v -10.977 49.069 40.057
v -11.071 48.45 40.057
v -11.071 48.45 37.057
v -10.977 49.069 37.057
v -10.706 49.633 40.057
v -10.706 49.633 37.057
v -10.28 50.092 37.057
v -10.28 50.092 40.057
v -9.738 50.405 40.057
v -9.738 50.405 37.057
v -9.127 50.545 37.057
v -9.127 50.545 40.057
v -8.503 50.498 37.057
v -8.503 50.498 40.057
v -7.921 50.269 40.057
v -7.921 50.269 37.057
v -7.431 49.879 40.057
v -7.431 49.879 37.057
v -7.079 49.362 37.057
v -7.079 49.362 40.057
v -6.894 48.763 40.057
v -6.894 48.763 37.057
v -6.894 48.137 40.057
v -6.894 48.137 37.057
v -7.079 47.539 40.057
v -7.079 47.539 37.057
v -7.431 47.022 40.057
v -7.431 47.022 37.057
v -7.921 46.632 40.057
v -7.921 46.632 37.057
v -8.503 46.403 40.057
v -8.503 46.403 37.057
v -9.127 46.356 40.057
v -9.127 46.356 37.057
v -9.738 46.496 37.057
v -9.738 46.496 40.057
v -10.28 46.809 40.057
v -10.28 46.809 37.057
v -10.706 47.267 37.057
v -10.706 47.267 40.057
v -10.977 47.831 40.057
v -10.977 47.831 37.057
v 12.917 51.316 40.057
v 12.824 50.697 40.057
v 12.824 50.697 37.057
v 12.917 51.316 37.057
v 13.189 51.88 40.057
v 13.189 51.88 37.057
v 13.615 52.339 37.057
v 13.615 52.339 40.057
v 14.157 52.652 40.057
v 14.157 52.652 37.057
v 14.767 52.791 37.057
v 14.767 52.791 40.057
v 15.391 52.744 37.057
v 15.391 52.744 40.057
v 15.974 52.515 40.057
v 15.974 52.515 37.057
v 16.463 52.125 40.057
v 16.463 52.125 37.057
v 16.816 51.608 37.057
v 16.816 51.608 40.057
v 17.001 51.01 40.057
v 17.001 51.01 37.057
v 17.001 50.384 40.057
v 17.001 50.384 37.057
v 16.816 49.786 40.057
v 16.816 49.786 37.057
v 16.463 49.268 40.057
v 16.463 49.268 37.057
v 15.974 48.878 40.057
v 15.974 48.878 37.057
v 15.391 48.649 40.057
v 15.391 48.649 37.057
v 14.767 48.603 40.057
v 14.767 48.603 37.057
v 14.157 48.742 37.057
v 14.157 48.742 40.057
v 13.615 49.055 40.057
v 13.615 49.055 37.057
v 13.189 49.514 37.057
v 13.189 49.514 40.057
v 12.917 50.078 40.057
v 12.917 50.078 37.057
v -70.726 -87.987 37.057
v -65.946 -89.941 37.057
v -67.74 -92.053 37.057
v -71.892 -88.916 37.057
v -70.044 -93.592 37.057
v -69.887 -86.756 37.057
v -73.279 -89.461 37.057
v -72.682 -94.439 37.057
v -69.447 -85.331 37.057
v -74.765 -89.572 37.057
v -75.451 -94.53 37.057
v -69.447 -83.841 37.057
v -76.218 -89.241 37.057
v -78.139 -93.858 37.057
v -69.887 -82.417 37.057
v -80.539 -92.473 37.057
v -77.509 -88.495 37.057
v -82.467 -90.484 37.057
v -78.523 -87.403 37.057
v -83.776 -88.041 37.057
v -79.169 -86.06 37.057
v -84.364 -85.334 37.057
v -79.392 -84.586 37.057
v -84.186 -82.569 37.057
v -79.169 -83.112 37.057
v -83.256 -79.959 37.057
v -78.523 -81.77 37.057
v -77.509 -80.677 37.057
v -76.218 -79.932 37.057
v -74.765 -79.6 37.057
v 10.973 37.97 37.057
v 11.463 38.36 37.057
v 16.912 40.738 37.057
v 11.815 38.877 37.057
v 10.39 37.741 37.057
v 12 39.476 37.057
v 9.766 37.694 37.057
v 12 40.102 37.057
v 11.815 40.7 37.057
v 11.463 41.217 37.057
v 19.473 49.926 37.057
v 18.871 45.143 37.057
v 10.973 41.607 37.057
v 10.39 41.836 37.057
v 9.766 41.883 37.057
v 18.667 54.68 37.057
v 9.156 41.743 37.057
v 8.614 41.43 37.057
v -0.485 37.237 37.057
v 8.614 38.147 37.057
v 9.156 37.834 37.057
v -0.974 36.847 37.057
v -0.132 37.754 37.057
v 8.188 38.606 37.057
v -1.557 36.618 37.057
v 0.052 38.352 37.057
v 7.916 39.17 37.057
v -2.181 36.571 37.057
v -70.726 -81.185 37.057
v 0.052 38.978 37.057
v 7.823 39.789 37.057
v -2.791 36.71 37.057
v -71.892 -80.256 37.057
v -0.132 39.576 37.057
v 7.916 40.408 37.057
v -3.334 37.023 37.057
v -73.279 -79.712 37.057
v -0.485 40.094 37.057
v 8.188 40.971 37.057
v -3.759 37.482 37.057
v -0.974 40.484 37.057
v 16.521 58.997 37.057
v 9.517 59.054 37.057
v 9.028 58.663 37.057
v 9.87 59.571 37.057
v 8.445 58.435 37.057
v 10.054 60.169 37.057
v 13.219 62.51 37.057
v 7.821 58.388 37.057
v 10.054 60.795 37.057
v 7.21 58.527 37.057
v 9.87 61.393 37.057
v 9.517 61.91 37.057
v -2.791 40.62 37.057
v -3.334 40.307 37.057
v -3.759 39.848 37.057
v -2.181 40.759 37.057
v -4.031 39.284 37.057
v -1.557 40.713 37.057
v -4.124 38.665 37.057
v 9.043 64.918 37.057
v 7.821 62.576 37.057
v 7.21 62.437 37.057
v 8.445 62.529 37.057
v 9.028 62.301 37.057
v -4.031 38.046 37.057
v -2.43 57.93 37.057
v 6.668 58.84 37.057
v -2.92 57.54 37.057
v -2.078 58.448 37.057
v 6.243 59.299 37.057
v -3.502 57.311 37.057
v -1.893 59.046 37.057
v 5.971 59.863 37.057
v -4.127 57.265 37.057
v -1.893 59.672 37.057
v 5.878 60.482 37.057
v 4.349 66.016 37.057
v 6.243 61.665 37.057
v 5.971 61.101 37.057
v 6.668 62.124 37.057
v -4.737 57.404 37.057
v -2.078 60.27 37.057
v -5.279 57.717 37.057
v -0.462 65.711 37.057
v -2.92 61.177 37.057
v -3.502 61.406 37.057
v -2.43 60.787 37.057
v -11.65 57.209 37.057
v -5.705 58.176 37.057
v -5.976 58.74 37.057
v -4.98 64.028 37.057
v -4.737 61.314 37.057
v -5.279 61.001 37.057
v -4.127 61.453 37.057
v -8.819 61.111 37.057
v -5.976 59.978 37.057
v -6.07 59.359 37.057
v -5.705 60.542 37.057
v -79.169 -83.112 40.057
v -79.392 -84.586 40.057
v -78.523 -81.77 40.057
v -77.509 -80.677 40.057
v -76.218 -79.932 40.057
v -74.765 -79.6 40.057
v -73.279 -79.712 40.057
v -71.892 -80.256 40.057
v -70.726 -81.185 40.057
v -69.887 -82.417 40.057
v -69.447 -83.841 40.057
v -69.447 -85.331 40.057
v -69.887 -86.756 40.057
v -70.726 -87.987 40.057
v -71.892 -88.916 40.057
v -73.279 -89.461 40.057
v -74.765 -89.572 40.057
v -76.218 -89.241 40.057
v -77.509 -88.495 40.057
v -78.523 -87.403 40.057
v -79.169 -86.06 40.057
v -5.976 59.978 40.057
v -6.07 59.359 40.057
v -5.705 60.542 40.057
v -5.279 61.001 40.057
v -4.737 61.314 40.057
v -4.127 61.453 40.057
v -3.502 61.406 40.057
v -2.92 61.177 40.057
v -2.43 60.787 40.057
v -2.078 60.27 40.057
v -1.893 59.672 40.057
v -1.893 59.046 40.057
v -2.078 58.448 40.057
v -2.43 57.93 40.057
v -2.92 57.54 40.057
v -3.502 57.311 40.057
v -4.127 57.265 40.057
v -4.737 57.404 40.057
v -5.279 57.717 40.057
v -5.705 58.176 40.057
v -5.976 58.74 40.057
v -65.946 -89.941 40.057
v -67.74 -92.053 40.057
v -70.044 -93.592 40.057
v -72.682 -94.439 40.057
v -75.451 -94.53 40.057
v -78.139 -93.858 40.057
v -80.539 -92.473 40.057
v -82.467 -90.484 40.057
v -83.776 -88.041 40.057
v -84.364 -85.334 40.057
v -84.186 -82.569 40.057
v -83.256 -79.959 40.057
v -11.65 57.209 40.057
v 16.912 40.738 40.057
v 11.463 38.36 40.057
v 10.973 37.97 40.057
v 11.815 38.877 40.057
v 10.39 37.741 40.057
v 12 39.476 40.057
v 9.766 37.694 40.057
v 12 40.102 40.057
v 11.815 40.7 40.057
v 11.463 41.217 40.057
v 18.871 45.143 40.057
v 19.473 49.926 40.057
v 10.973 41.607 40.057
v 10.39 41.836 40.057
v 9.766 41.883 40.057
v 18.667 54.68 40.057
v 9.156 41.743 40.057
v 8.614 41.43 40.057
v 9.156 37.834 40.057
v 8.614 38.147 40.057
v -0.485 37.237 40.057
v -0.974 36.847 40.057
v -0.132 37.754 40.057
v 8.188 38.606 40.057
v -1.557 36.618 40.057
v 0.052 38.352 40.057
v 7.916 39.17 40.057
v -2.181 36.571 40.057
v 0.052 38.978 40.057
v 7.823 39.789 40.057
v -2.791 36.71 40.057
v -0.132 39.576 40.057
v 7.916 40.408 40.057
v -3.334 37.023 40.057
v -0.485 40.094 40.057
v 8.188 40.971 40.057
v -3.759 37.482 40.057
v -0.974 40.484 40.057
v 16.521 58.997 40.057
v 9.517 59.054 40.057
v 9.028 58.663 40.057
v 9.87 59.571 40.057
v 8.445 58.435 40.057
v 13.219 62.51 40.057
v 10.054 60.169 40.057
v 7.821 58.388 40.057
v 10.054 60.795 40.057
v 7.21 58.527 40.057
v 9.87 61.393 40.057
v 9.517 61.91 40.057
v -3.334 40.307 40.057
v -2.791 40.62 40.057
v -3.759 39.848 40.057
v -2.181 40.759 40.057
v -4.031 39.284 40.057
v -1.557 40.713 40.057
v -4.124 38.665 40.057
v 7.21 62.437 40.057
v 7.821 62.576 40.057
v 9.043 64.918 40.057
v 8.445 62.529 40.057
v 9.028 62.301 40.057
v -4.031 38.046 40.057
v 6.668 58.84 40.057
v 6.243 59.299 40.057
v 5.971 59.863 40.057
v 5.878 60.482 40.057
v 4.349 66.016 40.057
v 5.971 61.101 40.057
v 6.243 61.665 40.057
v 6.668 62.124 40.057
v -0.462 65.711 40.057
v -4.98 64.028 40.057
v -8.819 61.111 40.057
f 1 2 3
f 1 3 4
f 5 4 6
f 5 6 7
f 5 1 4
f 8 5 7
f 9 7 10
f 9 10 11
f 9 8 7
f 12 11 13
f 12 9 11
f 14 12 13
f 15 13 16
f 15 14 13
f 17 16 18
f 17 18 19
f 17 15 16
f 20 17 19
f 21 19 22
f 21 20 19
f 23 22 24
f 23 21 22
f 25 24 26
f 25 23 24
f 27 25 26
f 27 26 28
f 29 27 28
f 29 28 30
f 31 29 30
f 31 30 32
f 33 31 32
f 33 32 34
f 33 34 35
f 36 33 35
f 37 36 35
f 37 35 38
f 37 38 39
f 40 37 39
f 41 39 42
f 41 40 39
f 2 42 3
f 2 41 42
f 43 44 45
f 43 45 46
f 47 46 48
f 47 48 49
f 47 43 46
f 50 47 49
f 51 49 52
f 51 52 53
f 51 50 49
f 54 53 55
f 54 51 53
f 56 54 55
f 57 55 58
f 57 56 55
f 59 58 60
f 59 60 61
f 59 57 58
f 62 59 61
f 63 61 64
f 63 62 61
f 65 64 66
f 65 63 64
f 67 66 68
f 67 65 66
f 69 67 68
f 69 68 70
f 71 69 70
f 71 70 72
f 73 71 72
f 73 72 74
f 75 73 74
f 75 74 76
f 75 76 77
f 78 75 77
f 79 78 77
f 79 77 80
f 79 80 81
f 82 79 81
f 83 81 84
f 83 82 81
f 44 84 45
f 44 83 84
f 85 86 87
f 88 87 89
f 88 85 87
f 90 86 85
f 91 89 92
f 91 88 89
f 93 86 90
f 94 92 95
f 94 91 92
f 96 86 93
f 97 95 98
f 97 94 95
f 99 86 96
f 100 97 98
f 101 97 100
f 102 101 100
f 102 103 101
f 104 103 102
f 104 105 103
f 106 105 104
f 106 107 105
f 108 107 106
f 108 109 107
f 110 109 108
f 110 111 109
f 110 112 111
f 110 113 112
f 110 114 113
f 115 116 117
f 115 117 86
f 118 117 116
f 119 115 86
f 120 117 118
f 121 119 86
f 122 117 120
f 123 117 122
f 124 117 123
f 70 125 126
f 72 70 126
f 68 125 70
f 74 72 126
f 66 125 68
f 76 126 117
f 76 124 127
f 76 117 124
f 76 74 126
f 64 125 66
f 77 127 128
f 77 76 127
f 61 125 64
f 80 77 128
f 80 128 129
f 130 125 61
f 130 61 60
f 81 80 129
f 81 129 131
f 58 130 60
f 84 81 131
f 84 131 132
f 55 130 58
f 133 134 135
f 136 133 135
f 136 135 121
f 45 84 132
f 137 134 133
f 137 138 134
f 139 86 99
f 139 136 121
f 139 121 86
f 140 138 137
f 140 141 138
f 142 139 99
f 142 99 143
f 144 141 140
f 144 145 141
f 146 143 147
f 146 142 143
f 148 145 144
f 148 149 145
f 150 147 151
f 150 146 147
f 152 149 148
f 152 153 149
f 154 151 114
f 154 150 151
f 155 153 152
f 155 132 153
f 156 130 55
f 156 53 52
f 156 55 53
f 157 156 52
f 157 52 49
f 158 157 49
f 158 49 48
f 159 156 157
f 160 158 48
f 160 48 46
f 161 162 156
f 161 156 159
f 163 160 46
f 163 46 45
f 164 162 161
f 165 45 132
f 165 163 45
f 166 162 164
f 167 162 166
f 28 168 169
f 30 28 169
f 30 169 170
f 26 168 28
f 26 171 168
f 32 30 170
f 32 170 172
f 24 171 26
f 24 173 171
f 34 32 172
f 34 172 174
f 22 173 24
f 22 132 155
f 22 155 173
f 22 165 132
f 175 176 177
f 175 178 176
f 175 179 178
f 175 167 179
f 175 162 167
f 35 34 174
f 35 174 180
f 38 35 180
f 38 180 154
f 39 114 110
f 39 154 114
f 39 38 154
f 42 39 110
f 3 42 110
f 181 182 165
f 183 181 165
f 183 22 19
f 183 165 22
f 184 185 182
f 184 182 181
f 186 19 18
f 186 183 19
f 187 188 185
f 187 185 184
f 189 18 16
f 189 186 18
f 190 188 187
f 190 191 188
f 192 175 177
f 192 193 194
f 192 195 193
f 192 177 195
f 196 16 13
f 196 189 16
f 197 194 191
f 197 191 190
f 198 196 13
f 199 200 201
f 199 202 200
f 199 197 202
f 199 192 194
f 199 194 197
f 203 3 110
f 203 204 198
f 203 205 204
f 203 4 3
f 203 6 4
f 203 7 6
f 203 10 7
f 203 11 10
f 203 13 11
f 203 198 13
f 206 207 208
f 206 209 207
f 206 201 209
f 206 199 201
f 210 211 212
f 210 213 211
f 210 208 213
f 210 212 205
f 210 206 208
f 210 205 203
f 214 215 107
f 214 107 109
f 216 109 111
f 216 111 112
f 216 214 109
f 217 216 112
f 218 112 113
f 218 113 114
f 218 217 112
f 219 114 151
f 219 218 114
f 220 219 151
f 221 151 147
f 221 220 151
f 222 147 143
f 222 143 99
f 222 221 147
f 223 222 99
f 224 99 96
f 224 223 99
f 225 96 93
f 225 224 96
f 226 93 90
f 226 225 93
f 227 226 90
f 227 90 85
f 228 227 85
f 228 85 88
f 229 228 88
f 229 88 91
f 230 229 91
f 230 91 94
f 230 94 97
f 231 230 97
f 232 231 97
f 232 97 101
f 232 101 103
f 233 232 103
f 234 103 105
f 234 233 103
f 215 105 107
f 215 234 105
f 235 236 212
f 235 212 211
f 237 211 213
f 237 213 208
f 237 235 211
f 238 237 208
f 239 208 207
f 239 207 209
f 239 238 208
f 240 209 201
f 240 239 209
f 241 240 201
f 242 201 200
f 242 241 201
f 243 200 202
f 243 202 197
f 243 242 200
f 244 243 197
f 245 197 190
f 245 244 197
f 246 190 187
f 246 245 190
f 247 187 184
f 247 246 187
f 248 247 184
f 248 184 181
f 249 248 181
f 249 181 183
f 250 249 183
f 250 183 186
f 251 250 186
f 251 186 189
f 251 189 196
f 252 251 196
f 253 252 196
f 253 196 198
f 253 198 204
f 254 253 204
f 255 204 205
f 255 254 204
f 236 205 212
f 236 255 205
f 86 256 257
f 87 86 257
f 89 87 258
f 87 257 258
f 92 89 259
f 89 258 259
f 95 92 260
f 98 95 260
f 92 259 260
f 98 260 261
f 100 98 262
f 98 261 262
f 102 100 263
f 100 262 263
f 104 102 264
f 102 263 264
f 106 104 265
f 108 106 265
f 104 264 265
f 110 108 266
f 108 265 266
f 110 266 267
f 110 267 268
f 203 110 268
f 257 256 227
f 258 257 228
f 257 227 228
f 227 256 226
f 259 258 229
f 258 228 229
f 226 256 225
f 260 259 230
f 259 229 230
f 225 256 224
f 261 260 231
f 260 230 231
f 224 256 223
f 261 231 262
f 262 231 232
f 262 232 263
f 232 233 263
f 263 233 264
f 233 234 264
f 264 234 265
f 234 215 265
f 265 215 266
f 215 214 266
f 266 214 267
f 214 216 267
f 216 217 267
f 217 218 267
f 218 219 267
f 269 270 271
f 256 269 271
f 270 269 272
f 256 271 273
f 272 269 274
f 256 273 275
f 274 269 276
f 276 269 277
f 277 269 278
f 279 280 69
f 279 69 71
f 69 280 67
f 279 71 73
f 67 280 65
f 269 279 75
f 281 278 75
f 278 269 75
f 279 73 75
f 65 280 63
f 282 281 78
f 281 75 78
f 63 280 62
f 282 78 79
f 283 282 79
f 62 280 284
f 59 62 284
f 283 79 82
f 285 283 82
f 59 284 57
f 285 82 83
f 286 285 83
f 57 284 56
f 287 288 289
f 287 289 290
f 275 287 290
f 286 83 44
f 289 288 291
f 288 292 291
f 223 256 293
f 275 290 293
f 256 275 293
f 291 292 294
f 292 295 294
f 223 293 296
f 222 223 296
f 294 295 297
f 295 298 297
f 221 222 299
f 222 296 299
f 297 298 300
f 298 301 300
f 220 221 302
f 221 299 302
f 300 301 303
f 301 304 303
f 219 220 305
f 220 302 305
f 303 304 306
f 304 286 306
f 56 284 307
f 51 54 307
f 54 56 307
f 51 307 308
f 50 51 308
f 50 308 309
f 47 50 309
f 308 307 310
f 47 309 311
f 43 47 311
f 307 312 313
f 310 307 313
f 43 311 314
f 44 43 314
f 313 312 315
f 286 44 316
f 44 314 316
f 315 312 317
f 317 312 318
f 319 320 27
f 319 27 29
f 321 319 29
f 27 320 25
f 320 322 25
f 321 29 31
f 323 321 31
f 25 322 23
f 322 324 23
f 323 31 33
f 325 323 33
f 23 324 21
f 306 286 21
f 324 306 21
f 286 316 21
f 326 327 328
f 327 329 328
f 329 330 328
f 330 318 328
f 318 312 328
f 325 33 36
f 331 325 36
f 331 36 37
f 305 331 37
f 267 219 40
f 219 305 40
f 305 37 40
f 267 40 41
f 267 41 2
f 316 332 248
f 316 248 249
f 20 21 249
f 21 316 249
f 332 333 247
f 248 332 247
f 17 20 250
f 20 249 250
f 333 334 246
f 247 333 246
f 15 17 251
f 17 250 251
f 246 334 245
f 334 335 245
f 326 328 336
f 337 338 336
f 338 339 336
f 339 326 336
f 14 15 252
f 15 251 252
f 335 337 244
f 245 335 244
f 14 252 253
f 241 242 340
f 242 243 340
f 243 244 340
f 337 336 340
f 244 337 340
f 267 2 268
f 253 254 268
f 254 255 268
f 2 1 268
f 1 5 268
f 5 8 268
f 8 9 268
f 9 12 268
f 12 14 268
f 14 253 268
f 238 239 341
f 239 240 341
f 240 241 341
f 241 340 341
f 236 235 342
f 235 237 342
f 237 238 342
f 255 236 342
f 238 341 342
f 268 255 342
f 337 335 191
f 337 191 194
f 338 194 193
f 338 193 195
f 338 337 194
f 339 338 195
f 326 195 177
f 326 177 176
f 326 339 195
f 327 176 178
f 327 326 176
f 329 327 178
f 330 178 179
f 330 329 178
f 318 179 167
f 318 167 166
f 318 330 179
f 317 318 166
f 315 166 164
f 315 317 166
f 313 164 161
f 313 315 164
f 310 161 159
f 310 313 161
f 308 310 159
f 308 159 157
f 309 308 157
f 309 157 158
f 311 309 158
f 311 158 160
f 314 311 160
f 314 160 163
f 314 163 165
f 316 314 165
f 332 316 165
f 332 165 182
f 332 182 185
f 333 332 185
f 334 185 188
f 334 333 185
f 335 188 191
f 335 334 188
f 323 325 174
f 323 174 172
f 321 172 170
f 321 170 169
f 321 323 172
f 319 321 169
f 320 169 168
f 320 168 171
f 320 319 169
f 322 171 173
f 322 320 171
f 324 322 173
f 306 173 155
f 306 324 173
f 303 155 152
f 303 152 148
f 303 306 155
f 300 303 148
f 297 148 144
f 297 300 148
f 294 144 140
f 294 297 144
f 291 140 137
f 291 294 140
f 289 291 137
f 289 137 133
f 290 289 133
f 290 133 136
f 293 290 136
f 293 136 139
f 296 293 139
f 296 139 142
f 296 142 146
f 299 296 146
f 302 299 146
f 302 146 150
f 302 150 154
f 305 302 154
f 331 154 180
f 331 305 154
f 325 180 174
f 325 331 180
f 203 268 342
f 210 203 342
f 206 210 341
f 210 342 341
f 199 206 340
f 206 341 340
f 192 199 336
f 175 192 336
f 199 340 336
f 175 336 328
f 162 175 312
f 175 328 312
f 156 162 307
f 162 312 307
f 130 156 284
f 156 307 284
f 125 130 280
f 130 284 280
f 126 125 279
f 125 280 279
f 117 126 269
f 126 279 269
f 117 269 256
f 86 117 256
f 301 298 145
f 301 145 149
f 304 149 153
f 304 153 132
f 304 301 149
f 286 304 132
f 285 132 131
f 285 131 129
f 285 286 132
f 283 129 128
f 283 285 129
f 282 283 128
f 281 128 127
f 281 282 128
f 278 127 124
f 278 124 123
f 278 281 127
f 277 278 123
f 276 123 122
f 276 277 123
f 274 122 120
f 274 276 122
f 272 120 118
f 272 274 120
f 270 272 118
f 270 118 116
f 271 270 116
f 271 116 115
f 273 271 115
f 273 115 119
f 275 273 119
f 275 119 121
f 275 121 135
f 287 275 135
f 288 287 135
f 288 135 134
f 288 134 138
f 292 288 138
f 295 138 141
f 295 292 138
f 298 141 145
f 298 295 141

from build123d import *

# Parameters (mm, degrees)
SKETCH_1_R      = 5
SKETCH_1_R_2    = 2.1
EXTRUDE_1_DEPTH = 3


with BuildPart() as part:
    # 草图1 → 凸台-拉伸1 (new body)
    with BuildSketch(Plane(origin=(0, 0, 40.05672841), x_dir=(-1, 0, 0), z_dir=(0, 0, -1))):
        with BuildLine():
            Line((83.25633153, -79.958506894), (11.650116444, 57.209335041))
            ThreePointArc((11.650116444, 57.209335041), (-11.219662978, 63.867129513), (-16.911730575, 40.738069772))
            Line((-16.911730575, 40.738069772), (65.946121215, -89.941091905))
            ThreePointArc((65.946121215, -89.941091905), (79.387248151, -93.248956728), (83.25633153, -79.958506894))
        make_face()
        with Locations((74.391553652, -84.586218334)):
            Circle(SKETCH_1_R, mode=Mode.SUBTRACT)
        with Locations((-14.924086576, 50.696801373)):
            Circle(SKETCH_1_R_2, mode=Mode.SUBTRACT)
        with Locations((-7.977715561, 60.481888482)):
            Circle(SKETCH_1_R_2, mode=Mode.SUBTRACT)
        with Locations((3.969603961, 59.358698272)):
            Circle(SKETCH_1_R_2, mode=Mode.SUBTRACT)
        with Locations((8.970552467, 48.450420955)):
            Circle(SKETCH_1_R_2, mode=Mode.SUBTRACT)
        with Locations((2.024181452, 38.665333847)):
            Circle(SKETCH_1_R_2, mode=Mode.SUBTRACT)
        with Locations((-9.92313807, 39.788524056)):
            Circle(SKETCH_1_R_2, mode=Mode.SUBTRACT)
    extrude(amount=EXTRUDE_1_DEPTH)


solid = part.part
